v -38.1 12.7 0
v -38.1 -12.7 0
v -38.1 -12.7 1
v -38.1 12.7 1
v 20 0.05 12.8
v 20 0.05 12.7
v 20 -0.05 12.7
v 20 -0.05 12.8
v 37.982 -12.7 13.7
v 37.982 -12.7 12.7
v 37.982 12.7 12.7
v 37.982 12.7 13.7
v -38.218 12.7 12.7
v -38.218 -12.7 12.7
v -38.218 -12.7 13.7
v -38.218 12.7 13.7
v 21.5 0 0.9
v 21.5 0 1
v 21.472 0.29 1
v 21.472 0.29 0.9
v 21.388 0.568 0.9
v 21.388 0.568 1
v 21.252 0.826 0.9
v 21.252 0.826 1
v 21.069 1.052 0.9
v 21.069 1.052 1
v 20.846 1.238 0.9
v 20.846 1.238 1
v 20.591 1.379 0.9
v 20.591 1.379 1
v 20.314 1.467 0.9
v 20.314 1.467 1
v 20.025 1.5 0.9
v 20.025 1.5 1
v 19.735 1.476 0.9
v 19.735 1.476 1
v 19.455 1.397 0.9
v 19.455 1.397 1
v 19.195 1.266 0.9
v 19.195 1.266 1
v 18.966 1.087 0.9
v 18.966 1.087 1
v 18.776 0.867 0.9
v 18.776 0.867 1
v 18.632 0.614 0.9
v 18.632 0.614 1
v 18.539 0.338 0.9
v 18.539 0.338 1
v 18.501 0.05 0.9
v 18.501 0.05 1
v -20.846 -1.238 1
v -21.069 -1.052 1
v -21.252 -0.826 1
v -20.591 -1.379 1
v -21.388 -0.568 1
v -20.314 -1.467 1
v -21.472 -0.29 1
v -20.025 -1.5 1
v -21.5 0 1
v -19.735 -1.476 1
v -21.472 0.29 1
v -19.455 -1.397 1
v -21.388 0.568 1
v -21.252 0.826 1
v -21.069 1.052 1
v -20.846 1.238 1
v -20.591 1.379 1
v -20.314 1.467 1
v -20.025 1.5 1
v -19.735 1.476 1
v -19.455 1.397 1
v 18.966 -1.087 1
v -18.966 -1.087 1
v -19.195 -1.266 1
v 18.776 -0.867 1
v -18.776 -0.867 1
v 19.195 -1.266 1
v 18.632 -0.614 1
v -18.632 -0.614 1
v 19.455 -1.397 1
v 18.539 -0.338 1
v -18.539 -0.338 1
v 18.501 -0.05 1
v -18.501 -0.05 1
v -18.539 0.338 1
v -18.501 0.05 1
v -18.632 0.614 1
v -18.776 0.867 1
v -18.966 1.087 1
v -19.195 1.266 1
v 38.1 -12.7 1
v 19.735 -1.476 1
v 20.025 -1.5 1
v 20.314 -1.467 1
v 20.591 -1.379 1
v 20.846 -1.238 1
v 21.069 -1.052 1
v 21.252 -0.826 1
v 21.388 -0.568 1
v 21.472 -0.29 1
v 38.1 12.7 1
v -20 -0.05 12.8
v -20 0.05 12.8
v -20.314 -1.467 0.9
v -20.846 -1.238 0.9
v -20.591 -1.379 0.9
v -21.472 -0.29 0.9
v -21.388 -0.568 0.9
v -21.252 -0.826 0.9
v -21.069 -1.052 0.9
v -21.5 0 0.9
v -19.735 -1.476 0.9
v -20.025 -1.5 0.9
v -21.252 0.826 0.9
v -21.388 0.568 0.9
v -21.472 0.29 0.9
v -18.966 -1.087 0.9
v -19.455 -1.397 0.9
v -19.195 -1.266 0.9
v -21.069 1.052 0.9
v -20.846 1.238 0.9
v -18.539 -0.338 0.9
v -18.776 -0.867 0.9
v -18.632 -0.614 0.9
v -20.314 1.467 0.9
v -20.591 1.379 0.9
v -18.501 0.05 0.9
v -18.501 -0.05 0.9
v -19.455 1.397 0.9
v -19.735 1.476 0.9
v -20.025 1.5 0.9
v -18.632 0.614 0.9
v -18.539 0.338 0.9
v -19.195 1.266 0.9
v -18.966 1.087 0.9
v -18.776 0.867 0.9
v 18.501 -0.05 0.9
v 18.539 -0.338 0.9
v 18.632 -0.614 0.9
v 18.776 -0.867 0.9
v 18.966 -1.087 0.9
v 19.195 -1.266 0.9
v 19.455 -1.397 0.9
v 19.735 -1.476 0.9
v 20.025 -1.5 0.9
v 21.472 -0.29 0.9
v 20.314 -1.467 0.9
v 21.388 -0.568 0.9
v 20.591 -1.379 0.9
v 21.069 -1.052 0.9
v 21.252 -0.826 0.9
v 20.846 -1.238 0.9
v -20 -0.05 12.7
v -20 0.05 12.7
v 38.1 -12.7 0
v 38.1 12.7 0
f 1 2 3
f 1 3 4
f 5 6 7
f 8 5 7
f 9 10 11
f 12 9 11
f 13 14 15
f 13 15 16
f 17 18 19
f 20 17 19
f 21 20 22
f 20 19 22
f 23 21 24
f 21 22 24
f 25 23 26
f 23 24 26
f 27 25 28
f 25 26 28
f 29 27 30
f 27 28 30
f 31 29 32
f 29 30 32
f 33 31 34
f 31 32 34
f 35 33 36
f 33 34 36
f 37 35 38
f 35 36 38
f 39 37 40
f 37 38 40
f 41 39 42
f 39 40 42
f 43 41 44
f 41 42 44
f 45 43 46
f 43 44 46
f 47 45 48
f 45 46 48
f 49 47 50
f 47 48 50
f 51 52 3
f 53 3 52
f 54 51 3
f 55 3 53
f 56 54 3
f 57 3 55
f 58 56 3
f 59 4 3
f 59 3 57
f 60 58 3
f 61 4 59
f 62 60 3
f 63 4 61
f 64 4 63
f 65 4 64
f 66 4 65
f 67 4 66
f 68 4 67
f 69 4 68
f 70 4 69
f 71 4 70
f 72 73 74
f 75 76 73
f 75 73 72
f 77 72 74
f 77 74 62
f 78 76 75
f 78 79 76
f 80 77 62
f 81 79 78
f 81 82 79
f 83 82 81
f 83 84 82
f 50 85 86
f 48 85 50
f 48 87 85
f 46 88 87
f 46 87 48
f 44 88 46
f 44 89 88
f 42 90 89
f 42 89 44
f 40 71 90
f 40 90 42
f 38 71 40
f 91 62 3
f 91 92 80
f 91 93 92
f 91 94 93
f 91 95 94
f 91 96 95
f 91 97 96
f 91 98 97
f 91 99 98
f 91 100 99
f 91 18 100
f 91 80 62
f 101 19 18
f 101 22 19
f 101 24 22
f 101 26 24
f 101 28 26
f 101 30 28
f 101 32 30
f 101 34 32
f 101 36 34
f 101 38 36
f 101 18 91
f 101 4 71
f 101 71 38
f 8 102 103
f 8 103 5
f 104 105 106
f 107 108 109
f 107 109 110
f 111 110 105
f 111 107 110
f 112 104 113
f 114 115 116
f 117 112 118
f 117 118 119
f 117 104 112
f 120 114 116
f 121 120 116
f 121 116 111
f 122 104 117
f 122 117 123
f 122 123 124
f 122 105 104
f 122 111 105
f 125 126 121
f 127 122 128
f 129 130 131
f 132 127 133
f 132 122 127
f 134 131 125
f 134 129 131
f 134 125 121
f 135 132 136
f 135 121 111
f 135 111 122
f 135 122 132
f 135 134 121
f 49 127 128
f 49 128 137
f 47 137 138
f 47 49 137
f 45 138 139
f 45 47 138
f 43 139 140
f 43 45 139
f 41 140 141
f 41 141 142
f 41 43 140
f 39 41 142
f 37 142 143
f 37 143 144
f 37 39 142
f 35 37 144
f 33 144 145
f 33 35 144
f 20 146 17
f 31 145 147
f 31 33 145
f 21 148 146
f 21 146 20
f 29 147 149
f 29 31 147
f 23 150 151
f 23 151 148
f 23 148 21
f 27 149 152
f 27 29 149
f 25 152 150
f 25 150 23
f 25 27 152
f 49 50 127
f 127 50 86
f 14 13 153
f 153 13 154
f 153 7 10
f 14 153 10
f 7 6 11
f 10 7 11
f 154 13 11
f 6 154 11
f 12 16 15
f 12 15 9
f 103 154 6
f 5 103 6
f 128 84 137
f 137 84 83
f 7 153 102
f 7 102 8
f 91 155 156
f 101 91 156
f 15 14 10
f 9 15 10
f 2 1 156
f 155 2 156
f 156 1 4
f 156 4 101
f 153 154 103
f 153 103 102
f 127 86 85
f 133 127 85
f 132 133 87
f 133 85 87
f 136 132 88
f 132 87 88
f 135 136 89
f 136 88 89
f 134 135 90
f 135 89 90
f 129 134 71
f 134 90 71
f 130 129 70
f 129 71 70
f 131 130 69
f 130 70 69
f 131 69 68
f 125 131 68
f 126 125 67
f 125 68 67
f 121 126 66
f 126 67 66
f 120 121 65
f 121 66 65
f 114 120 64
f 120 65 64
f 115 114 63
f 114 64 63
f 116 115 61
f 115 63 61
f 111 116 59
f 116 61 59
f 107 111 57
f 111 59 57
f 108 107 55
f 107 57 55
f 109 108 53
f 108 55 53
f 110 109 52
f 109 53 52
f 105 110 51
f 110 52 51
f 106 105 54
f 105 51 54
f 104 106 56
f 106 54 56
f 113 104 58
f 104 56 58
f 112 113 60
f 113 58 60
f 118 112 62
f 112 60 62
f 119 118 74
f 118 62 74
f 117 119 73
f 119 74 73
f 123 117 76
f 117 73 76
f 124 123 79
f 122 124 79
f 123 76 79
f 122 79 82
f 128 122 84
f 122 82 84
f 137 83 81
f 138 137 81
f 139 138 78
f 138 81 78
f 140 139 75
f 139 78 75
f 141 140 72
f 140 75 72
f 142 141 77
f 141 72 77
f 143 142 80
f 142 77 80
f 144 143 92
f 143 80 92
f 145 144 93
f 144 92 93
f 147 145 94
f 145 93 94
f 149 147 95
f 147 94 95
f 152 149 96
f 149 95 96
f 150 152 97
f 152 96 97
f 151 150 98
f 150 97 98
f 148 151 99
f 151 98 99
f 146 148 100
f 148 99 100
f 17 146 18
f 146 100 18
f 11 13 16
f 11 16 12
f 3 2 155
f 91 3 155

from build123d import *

# Parameters (mm, degrees)
F0_W     = 76.2
F0_H     = 25.4
F1_DEPTH = 1
F3_DEPTH = 0.1
F5_W     = 76.2
F5_H     = 25.4
F6_DEPTH = 1
F7_W     = 40
F7_H     = 0.1
F8_DEPTH = 0.1


with BuildPart() as f1:
    # F0 (on Top) → F1 (new body)
    with BuildSketch(Plane.XY):
        Rectangle(F0_W, F0_H)
    extrude(amount=F1_DEPTH)

    # F2 (on face) → F3 (cut)
    with BuildSketch(Plane.XY.offset(1)):
        with BuildLine():
            ThreePointArc((18.5008335649, -0.05), (18.5, 0), (18.5008335649, 0.05))
            Line((18.5008335649, 0.05), (-18.5008335649, 0.05))
            ThreePointArc((-18.5008335649, 0.05), (-18.5002084057, 0.0250034739), (-18.5, 0))
            ThreePointArc((-18.5, 0), (-18.5002084057, -0.0250034739), (-18.5008335649, -0.05))
            Line((-18.5008335649, -0.05), (18.5008335649, -0.05))
        make_face()
        with BuildLine():
            ThreePointArc((-18.5, 0), (-18.5002084057, 0.0250034739), (-18.5008335649, 0.05))
            Line((-18.5008335649, 0.05), (-20, 0.05))
            Line((-20, 0.05), (-20, -0.05))
            Line((-20, -0.05), (-18.5008335649, -0.05))
            ThreePointArc((-18.5008335649, -0.05), (-18.5002084057, -0.0250034739), (-18.5, 0))
        make_face()
        with BuildLine():
            Line((-20, 0.05), (-18.5008335649, 0.05))
            ThreePointArc((-18.5008335649, 0.05), (-21.5, 0), (-18.5008335649, -0.05))
            Line((-18.5008335649, -0.05), (-20, -0.05))
            Line((-20, -0.05), (-20, 0.05))
        make_face()
        with BuildLine():
            Line((18.5008335649, 0.05), (20, 0.05))
            Line((20, 0.05), (20, -0.05))
            Line((20, -0.05), (18.5008335649, -0.05))
            ThreePointArc((18.5008335649, -0.05), (20.0250034739, -1.4997915943), (21.5, 0))
            ThreePointArc((21.5, 0), (20.0250034739, 1.4997915943), (18.5008335649, 0.05))
        make_face()
        with BuildLine():
            Line((20, -0.05), (20, 0.05))
            Line((20, 0.05), (18.5008335649, 0.05))
            ThreePointArc((18.5008335649, 0.05), (18.5, 0), (18.5008335649, -0.05))
            Line((18.5008335649, -0.05), (20, -0.05))
        make_face()
    extrude(amount=-F3_DEPTH, mode=Mode.SUBTRACT)


with BuildPart() as f6:
    # F5 (on offset) → F6 (new body)
    with BuildSketch(Plane.XY.offset(12.7)):
        with Locations((-0.1183587592, -1.746e-07)):
            Rectangle(F5_W, F5_H)
    extrude(amount=F6_DEPTH)

    # F7 (on face) → F8 (cut)
    with BuildSketch(Plane(origin=(0, 0, 12.7), x_dir=(1, 0, 0), z_dir=(0, 0, -1))):
        Rectangle(F7_W, F7_H)
    extrude(amount=-F8_DEPTH, mode=Mode.SUBTRACT)


solid = Compound([f1.part, f6.part])
